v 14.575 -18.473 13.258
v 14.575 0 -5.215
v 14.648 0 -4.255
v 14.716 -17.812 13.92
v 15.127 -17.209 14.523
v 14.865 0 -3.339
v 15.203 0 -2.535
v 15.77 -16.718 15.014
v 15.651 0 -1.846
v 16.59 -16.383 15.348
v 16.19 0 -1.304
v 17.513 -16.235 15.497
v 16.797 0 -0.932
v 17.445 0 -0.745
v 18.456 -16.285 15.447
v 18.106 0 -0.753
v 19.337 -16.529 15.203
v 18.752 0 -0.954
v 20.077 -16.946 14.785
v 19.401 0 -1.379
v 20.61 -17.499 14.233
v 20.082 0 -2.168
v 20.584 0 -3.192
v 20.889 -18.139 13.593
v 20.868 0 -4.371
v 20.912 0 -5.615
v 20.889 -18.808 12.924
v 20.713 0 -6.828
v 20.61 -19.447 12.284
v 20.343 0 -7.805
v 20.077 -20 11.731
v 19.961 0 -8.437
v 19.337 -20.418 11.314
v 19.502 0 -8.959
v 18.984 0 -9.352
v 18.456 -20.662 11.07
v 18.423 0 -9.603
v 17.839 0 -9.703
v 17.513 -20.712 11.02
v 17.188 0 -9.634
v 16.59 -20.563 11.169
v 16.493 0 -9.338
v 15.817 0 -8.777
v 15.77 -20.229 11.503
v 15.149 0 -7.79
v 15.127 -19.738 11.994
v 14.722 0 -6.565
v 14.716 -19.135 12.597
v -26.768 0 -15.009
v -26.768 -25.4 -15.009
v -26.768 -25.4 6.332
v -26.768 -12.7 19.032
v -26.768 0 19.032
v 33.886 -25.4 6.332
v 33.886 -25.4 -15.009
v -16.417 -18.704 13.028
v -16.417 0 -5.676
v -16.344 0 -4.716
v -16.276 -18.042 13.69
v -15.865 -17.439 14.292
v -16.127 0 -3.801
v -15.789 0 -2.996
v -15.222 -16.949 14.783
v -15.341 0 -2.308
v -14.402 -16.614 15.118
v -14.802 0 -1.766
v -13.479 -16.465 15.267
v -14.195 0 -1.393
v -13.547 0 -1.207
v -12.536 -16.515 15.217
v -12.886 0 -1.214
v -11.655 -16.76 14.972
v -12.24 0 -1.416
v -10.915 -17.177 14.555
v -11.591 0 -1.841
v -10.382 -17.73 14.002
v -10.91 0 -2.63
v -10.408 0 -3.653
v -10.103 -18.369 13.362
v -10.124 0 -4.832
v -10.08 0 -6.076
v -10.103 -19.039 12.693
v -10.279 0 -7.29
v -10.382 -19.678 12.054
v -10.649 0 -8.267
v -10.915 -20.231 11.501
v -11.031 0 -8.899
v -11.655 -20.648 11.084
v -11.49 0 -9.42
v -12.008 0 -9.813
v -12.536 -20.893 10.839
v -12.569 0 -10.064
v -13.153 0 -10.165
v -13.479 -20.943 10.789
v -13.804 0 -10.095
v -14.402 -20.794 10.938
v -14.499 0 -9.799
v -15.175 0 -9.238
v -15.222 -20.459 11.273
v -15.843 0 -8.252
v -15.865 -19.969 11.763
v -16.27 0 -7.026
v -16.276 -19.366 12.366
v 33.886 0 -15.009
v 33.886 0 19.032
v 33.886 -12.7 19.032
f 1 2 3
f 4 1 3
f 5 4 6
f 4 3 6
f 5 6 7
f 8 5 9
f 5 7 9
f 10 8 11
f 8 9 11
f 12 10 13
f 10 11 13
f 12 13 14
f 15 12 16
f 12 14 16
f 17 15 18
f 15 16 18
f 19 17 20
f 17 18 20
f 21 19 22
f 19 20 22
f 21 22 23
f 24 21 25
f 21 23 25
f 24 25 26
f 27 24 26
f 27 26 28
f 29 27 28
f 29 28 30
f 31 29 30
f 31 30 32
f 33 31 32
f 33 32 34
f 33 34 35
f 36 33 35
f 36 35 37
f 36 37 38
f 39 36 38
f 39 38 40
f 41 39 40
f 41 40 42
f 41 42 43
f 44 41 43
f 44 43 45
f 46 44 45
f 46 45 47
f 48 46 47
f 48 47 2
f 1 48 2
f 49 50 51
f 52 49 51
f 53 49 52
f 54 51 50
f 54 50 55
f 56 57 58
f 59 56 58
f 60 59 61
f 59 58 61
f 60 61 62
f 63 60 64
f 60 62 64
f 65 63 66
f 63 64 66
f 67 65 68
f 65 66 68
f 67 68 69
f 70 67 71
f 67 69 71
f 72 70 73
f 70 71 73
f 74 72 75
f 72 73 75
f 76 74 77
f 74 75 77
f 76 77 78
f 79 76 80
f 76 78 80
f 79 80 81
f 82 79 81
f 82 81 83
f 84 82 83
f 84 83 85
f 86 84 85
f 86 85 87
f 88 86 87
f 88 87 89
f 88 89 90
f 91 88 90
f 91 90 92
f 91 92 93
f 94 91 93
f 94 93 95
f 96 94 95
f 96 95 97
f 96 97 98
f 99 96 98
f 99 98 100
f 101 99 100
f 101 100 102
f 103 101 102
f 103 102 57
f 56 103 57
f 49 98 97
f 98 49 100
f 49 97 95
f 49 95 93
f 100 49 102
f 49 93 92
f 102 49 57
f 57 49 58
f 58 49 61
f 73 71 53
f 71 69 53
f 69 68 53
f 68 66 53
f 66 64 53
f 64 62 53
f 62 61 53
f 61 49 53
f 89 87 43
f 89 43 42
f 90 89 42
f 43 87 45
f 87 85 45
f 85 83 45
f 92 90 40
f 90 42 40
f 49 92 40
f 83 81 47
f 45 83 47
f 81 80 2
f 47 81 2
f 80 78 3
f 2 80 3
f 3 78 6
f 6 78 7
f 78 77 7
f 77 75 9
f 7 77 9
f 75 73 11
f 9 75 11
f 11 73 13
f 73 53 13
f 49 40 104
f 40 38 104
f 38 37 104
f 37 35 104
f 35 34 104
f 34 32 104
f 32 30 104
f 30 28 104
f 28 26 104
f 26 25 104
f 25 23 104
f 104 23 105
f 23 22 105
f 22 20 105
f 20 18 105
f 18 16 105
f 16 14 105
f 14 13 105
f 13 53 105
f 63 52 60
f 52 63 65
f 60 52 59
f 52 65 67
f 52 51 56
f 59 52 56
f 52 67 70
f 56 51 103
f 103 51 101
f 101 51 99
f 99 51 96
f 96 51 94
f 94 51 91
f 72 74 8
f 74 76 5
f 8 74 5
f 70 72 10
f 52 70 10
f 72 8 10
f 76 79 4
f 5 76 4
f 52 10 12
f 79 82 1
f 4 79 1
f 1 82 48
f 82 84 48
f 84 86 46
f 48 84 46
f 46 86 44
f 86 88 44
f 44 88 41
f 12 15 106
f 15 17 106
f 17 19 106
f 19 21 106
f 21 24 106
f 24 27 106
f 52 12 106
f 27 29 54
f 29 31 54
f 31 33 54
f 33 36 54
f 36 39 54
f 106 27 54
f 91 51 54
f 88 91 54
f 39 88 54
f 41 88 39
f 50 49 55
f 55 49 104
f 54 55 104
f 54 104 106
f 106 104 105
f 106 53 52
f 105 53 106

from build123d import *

# Parameters (mm, degrees)
F0_W     = 60.654063
F0_H     = 34.040548
F1_DEPTH = 25.4
F2_SIZE  = 12.7
F4_D     = 6.35


with BuildPart() as f1:
    # F0 (on Front) → F1 (new body)
    with BuildSketch(Plane.XZ):
        with Locations((3.558782, 2.011489)):
            Rectangle(F0_W, F0_H)
    extrude(amount=F1_DEPTH)

    # F2
    f2_edges = [f1.edges().sort_by_distance(p)[0] for p in [
        (3.558783, -25.4, 19.031763),
    ]]
    chamfer(f2_edges, length=F2_SIZE)

    # F4 (through all)
    with Locations(Plane(origin=(0, -15.865882, 15.865882), x_dir=(1, 0, 0), z_dir=(0, -0.707107, 0.707107))):
        with Locations((-13.242152, -4.013676), (17.749857, -3.687446)):
            Hole(F4_D / 2)


solid = f1.part
